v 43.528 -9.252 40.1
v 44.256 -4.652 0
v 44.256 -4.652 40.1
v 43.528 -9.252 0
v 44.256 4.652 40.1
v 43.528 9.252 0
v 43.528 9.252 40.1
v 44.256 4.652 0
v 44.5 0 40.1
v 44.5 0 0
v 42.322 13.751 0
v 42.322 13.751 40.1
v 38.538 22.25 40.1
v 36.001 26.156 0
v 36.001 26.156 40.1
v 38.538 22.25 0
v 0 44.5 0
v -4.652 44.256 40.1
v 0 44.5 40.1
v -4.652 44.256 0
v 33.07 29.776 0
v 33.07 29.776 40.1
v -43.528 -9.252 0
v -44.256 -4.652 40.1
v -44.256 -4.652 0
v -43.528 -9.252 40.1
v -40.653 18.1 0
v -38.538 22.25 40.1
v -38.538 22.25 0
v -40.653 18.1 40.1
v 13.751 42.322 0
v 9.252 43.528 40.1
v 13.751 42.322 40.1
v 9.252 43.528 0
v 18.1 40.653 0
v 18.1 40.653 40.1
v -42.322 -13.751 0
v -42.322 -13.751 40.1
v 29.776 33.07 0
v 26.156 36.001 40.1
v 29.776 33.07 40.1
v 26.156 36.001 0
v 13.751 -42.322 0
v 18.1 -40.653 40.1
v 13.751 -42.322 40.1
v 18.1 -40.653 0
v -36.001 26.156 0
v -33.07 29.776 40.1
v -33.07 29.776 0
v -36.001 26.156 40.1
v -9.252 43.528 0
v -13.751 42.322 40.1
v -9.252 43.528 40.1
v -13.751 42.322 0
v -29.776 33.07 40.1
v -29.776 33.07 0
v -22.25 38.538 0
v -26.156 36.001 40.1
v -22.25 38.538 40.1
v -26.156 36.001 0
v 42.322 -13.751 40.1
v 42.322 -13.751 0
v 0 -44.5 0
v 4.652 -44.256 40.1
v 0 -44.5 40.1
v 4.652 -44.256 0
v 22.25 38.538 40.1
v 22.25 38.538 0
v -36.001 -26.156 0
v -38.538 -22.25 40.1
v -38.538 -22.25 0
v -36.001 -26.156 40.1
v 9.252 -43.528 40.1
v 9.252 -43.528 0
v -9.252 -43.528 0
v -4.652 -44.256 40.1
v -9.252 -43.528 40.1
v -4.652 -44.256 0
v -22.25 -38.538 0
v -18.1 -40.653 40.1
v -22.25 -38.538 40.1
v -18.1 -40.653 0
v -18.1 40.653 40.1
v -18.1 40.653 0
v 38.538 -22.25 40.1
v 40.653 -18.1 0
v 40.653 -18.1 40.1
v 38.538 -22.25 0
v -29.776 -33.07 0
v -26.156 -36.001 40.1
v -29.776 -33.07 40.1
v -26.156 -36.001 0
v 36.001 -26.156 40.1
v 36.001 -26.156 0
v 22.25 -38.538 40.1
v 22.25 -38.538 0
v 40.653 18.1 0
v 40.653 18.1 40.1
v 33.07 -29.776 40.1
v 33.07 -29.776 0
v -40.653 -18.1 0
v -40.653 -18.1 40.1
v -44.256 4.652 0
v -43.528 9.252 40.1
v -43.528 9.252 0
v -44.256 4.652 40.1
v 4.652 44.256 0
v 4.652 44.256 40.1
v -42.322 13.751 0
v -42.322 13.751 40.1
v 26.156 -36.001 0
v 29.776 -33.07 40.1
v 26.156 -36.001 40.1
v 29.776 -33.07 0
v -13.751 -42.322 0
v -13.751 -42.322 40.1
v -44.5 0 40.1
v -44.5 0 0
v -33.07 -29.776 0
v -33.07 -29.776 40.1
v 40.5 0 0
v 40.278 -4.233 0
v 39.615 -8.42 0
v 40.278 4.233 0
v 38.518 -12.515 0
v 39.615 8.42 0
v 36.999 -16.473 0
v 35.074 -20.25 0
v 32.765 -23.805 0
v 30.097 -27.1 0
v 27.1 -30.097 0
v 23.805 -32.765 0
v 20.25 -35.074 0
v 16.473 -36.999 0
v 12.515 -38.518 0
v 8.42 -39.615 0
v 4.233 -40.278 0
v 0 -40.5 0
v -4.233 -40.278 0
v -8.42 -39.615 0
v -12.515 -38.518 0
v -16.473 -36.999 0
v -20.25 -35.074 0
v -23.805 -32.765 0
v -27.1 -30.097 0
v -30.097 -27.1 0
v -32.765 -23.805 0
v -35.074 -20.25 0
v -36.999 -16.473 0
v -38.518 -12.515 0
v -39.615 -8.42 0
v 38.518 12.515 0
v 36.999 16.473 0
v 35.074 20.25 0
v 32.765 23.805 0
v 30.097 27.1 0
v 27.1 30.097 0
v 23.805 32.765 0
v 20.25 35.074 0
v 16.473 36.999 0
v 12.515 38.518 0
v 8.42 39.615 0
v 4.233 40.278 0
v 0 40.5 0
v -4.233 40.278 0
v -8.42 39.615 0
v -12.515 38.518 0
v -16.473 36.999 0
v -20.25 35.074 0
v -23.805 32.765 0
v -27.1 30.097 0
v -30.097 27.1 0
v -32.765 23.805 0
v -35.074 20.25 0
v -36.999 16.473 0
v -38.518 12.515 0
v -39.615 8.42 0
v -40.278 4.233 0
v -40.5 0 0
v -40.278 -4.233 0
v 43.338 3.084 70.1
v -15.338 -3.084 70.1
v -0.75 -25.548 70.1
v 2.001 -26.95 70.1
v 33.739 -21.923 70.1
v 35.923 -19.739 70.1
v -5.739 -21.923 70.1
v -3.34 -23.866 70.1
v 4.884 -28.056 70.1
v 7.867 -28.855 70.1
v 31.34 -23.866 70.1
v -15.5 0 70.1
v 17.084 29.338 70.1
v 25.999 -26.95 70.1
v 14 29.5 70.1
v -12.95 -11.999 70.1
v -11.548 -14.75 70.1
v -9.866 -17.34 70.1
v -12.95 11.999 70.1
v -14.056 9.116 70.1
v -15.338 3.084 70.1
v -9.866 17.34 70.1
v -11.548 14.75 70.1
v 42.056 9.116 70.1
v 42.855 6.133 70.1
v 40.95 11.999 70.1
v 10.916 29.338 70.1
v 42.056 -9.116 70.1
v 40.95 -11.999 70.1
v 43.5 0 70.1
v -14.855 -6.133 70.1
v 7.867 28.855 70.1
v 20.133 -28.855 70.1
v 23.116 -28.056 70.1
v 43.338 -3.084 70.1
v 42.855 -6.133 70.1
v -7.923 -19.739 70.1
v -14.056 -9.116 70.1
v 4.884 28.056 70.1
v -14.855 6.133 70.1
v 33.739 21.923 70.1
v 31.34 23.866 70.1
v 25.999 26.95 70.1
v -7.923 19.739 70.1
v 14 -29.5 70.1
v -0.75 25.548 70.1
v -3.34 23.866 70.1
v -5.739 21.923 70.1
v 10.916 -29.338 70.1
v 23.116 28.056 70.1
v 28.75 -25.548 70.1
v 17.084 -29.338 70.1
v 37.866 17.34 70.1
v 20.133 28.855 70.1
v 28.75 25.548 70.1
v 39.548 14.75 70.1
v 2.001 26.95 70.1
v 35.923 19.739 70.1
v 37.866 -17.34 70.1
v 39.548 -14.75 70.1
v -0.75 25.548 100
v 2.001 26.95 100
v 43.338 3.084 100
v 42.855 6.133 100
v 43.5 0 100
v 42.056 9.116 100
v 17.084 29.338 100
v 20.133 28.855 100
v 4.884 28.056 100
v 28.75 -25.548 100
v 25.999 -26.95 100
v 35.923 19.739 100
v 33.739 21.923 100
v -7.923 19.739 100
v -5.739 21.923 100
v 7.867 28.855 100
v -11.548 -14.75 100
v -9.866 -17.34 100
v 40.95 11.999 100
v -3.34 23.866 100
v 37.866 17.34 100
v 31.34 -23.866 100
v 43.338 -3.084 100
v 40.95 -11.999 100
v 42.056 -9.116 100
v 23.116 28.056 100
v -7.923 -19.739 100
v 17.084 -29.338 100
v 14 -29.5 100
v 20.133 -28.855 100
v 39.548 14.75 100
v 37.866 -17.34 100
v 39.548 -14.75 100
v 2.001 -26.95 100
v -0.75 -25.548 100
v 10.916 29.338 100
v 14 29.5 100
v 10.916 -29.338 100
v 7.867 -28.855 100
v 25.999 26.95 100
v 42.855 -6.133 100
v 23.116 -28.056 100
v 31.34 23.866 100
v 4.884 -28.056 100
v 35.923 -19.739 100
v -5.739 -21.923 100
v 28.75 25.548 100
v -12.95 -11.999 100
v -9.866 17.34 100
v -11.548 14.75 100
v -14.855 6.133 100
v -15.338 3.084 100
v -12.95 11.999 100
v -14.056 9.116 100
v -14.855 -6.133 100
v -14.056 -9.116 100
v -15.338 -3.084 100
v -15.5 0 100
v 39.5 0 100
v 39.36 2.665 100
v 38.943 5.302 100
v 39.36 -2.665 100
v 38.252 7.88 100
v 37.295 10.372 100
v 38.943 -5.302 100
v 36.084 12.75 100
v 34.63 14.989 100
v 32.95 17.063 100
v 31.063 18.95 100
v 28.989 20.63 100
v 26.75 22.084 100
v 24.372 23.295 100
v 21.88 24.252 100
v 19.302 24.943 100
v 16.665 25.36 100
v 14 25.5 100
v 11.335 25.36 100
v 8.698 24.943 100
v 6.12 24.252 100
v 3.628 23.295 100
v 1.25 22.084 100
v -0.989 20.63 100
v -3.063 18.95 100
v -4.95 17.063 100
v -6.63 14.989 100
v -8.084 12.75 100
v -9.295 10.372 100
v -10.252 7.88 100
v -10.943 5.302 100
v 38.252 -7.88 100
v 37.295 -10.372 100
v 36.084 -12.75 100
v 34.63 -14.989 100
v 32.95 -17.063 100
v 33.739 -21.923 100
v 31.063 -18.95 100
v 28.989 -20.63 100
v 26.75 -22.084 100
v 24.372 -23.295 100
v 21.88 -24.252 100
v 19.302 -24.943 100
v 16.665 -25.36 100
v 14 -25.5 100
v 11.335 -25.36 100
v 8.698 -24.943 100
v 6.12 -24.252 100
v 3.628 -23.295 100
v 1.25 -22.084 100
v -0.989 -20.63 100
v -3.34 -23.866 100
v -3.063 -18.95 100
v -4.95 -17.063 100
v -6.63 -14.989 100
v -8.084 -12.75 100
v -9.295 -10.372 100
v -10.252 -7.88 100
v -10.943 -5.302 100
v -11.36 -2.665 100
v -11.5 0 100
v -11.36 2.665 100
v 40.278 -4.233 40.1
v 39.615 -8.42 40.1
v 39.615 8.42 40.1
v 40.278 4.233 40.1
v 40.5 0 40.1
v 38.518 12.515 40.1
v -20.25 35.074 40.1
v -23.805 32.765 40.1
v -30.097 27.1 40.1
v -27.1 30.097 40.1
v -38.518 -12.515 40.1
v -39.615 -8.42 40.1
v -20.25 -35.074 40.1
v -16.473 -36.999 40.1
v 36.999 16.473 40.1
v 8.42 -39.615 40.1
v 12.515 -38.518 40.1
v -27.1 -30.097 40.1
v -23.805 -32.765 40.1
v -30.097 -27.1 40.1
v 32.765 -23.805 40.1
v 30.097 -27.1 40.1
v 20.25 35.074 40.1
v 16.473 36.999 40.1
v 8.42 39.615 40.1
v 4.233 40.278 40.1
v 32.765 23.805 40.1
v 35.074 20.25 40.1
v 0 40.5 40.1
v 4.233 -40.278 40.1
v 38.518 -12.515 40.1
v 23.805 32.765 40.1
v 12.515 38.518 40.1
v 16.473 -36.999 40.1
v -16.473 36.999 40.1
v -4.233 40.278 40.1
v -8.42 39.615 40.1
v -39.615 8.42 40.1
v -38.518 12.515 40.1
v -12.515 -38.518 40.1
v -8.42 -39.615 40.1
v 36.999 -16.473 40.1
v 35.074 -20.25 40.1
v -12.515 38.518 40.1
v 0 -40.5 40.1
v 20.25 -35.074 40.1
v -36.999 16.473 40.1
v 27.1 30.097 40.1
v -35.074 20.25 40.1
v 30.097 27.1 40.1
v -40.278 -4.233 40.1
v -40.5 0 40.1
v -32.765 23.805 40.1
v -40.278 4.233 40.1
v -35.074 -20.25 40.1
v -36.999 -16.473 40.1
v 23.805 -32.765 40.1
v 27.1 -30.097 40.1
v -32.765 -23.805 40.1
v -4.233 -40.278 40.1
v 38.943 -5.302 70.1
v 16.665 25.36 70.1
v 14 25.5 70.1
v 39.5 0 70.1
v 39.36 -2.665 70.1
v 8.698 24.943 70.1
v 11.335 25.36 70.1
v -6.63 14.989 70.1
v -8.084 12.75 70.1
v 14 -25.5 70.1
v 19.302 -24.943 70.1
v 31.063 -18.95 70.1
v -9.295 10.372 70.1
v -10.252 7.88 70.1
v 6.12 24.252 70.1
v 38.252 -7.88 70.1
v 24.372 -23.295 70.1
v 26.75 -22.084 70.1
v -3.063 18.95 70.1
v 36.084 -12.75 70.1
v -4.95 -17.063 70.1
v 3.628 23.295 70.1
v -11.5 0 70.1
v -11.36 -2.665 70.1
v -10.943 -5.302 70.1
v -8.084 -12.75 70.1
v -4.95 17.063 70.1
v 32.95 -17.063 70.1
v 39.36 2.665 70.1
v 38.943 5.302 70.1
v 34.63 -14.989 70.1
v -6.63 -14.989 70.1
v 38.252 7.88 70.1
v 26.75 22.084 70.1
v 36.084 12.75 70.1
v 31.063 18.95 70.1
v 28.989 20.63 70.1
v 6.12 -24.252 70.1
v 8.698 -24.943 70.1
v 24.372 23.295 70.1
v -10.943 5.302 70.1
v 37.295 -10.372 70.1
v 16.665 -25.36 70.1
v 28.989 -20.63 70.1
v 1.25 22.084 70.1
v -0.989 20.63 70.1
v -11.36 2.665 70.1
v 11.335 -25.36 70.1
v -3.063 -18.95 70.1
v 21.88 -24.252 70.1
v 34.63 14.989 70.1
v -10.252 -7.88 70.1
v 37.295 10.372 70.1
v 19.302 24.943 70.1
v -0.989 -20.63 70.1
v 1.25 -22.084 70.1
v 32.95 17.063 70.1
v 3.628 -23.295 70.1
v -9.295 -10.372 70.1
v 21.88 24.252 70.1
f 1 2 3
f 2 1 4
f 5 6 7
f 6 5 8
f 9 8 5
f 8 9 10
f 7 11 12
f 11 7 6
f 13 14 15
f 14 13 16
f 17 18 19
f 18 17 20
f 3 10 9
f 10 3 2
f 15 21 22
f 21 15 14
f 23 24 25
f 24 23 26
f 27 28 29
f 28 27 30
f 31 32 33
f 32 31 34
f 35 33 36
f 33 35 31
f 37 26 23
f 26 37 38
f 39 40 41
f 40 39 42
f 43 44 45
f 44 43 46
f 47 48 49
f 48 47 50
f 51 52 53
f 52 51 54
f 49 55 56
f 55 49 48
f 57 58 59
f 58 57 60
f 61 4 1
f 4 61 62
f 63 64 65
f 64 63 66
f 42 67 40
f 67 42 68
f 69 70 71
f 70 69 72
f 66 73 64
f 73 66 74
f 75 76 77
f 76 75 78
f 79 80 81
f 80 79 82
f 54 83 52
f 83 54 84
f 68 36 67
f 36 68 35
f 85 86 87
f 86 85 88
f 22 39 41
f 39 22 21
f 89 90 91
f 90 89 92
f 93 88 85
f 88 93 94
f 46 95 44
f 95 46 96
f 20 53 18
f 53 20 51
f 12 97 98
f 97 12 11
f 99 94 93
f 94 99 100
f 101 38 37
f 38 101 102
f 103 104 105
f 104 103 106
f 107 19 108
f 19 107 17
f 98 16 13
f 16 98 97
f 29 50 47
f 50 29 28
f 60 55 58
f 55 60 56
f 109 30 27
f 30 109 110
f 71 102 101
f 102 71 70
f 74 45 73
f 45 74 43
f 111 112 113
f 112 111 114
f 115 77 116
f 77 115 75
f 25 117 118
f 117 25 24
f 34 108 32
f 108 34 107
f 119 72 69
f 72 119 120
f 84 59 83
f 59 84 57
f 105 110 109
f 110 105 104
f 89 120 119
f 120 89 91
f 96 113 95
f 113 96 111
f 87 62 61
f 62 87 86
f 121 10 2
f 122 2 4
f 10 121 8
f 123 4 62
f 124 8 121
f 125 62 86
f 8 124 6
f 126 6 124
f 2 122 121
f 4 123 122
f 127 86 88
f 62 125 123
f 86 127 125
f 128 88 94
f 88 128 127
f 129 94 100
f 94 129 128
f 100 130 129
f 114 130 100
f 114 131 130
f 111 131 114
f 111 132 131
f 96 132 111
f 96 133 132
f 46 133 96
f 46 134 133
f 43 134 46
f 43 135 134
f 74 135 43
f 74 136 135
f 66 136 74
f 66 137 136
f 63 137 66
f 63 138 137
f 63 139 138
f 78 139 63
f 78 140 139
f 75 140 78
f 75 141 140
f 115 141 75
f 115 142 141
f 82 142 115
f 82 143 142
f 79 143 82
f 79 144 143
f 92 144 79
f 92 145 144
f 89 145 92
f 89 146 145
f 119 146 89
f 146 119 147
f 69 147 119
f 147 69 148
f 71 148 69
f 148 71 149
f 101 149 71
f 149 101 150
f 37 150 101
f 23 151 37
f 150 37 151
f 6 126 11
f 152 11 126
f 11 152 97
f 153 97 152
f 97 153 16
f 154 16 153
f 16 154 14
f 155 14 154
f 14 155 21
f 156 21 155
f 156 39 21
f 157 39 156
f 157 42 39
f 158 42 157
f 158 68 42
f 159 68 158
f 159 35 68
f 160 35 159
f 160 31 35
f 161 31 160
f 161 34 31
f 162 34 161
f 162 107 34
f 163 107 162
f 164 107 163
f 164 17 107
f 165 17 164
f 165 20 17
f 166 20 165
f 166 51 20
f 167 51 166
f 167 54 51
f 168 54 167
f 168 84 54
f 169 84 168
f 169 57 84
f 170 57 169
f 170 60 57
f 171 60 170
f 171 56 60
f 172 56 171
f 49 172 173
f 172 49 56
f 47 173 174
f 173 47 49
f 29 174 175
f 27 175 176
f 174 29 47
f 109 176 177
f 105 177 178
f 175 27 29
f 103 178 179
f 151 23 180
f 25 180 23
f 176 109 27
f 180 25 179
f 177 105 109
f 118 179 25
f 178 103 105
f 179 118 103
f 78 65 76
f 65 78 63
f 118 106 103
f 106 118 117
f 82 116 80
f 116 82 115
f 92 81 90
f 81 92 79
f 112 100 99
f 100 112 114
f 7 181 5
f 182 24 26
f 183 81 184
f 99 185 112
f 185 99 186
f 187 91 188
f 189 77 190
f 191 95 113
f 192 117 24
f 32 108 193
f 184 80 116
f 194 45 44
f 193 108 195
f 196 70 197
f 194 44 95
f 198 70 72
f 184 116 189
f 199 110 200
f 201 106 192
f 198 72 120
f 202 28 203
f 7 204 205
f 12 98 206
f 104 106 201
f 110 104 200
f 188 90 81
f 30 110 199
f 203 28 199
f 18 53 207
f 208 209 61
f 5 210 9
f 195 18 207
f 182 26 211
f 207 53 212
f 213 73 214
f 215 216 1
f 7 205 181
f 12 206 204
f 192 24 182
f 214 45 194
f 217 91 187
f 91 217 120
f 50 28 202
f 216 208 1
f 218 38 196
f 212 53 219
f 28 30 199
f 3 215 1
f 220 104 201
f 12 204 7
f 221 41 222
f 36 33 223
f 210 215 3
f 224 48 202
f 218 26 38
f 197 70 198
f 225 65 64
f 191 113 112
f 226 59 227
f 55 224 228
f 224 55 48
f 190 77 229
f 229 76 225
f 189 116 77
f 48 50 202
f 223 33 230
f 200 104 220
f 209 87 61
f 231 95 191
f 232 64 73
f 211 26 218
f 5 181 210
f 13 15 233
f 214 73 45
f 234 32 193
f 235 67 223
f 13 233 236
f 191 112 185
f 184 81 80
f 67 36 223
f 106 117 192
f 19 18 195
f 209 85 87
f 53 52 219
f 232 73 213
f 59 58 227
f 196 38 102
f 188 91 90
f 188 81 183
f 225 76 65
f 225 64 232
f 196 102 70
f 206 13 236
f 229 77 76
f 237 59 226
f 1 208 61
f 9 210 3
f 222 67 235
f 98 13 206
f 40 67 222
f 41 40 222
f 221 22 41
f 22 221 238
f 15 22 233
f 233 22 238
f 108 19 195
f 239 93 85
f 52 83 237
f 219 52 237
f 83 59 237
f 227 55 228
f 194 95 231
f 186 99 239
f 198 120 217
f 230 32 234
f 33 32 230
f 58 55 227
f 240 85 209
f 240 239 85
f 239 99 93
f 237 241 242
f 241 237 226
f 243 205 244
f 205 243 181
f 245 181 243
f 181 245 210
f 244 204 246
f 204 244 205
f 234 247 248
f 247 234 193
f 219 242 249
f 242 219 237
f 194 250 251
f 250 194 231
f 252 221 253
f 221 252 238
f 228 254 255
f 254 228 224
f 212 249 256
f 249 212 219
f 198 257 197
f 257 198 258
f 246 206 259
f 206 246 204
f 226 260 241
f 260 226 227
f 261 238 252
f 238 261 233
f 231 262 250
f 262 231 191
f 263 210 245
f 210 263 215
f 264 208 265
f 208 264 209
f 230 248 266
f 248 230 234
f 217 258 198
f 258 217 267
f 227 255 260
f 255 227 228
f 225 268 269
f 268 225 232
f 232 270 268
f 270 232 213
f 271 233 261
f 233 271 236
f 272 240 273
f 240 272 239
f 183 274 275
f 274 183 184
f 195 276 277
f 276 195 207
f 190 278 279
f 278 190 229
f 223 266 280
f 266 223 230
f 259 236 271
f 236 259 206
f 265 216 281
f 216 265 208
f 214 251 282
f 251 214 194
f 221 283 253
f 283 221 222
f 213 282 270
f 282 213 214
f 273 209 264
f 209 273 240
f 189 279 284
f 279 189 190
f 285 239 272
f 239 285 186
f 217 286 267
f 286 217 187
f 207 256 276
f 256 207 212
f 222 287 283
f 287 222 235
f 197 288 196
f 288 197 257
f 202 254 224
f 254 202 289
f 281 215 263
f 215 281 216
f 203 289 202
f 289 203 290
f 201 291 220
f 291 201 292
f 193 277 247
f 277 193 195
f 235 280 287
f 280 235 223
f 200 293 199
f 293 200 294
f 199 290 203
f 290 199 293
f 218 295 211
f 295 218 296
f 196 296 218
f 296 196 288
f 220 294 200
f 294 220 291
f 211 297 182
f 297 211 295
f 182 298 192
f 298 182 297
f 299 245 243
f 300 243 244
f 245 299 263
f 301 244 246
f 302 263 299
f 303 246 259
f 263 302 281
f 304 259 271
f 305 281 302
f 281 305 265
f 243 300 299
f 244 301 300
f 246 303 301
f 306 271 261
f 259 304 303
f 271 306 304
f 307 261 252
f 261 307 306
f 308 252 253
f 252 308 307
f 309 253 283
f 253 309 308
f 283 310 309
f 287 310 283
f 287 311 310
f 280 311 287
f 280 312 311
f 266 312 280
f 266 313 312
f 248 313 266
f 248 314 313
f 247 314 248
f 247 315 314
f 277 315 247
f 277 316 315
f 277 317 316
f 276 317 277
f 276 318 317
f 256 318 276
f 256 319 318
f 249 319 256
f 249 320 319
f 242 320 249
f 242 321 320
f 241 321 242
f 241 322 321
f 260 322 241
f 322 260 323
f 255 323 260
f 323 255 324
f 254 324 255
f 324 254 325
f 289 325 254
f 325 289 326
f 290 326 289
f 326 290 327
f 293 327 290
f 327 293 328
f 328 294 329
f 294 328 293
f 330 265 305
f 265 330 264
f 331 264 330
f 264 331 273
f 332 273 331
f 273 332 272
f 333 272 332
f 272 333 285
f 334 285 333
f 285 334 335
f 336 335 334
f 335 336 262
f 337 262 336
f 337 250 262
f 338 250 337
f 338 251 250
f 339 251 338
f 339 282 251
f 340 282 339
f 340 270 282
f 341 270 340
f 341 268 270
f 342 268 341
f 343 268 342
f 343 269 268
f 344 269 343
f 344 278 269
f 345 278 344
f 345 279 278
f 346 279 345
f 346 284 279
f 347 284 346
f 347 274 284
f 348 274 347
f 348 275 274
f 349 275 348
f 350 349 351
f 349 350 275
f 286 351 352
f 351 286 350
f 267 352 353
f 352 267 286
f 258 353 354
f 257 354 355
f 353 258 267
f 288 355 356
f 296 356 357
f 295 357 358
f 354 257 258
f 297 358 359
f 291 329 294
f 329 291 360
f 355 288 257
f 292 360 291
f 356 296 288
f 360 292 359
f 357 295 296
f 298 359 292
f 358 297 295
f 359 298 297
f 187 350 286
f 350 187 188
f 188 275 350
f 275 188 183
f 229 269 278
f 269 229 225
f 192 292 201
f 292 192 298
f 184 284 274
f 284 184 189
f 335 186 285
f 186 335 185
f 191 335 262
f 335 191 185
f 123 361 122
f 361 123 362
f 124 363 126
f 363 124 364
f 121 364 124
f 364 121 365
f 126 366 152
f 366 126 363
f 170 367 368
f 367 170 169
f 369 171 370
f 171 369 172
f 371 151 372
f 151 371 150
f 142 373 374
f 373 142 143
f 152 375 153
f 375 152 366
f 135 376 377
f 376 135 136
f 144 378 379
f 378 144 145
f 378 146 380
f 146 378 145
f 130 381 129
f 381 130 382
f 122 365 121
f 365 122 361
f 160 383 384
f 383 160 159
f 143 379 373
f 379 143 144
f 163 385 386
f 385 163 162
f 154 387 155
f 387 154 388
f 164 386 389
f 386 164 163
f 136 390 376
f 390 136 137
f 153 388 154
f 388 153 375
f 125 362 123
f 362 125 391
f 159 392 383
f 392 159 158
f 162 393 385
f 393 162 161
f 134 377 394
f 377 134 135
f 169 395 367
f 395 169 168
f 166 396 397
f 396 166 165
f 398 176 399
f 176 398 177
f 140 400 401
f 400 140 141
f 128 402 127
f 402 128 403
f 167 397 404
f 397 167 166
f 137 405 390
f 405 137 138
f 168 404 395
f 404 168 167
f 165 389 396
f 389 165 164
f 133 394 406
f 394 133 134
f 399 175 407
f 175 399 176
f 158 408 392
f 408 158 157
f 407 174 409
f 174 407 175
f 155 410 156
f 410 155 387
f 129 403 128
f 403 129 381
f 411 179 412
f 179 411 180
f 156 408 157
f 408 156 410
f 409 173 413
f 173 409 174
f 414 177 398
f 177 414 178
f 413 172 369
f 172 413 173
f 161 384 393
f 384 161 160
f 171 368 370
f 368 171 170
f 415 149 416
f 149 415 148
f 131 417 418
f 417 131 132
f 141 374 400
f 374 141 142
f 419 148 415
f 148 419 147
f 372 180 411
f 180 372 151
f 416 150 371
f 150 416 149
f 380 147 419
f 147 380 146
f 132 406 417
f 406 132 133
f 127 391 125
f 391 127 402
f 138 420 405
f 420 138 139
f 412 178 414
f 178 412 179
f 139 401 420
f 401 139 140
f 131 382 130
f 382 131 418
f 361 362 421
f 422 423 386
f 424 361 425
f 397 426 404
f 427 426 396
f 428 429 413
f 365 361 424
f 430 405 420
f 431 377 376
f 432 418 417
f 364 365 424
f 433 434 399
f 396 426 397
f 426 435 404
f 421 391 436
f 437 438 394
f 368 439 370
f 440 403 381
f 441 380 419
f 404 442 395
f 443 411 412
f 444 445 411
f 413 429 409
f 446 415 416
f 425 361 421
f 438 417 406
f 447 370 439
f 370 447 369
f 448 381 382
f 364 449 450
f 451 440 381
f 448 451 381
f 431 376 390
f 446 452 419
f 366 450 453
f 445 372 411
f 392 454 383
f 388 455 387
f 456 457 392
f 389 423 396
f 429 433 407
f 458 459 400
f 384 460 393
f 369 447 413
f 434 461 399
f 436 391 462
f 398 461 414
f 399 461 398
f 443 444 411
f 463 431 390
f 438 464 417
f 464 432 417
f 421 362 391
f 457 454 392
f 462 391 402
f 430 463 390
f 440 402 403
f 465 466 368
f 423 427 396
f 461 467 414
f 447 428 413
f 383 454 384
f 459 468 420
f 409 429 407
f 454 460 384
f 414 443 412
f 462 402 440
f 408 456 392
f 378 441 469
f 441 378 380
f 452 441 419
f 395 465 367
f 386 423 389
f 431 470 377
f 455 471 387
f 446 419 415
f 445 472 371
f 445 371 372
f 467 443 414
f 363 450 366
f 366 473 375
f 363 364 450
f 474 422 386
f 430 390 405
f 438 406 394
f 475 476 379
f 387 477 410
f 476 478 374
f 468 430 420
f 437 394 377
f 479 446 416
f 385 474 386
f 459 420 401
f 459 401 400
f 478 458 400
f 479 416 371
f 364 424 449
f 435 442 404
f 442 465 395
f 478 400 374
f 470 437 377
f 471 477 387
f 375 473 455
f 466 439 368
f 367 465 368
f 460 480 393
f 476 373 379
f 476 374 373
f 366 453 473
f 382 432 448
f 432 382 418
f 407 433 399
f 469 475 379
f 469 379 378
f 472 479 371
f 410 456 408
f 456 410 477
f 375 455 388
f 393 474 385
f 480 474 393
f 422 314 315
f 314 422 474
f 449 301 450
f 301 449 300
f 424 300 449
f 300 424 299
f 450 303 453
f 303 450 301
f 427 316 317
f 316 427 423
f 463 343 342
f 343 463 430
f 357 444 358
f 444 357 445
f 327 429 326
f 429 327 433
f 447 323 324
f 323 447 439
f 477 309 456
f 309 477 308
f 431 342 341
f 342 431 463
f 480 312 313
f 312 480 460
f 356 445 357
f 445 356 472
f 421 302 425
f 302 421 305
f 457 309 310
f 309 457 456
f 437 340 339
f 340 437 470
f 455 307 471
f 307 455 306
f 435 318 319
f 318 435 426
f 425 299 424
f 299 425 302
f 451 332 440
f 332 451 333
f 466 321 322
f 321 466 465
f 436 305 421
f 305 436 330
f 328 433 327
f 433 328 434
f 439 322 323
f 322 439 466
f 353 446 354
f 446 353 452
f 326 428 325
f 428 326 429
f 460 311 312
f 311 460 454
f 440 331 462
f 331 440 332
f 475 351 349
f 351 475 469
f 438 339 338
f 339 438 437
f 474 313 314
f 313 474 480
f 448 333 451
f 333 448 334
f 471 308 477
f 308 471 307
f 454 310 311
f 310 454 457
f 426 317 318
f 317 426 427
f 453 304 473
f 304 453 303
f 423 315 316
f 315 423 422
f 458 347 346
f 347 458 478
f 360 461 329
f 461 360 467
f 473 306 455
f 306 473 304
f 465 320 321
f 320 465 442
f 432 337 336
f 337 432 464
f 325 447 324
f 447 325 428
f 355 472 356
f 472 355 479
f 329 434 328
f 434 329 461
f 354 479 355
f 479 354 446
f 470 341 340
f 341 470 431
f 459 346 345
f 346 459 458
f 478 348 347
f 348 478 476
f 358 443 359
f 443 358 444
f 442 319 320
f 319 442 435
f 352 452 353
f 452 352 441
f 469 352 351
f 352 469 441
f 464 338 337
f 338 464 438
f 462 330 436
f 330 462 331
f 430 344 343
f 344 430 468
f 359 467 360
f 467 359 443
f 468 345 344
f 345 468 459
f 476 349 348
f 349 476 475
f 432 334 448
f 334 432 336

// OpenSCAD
// Pipe Adapter - Parametric Design
// Connects two different diameter pipes with smooth curved transition
// Designed to fit OVER the outside of pipes (external coupling)
// Input: Inner diameters of the pipes to be connected

// ===== PIPE SPECIFICATIONS =====
// Pipe diameters that the adapter will slip over
pipe1_inner_dia = 80;    // mm - diameter that adapter end 1 will slip over
pipe2_inner_dia = 50;    // mm - diameter that adapter end 2 will slip over

// These are NOT used in calculations - kept for reference only
pipe1_wall_thickness = 6;  // mm - wall thickness of pipe 1 (reference only)
pipe2_wall_thickness = 6;  // mm - wall thickness of pipe 2 (reference only)

// ===== ADAPTER SPECIFICATIONS =====
// Adapter wall thickness
adapter_wall_thickness = 4;  // mm - wall thickness of the adapter itself

// Collar dimensions (parts that fit over the pipes)
collar1_length = 40;     // mm - length of collar for pipe 1
collar2_length = 30;     // mm - length of collar for pipe 2

// Transition section
transition_length = 30;  // mm - length of the curved transition

// Transition offset (for angled or offset adapters)
transition_offset_x = 14; // mm - horizontal offset in X direction
transition_offset_y = 0; // mm - horizontal offset in Y direction
// Note: Positive values move pipe2 end relative to pipe1 end
// Example: transition_offset_x = 10 moves pipe2 end 10mm in +X direction

// ===== FIT AND TOLERANCE =====
// Clearances for proper fit (adjust for your 3D printer's accuracy)
collar_clearance = 0.5;   // mm - radial clearance between adapter and pipe outer surface
wall_clearance = 0.1;     // mm - clearance to avoid interference

// ===== DESIGN OPTIONS =====
smooth_transition = true; // true for curved transition, false for linear (locked to true for your preference)
show_reference_pipes = false; // set to true to see pipe outlines for reference

// Rendering quality
$fn = 60; // Higher values = smoother curves, slower rendering

// ===== CALCULATED VALUES =====
// Adapter inner diameters (exact diameters you specified + clearance)
adapter1_inner_dia = pipe1_inner_dia + 2 * collar_clearance;
adapter2_inner_dia = pipe2_inner_dia + 2 * collar_clearance;

// Adapter outer diameters
adapter1_outer_dia = adapter1_inner_dia + 2 * adapter_wall_thickness;
adapter2_outer_dia = adapter2_inner_dia + 2 * adapter_wall_thickness;

// Calculate pipe outer diameters for reference display only
pipe1_outer_dia = pipe1_inner_dia + 2 * pipe1_wall_thickness;
pipe2_outer_dia = pipe2_inner_dia + 2 * pipe2_wall_thickness;

// Total length
total_length = collar1_length + transition_length + collar2_length;

// Calculate actual transition distance (accounting for offset)
actual_transition_distance = sqrt(pow(transition_length, 2) + pow(transition_offset_x, 2) + pow(transition_offset_y, 2));

// ===== VALIDATION =====
// Check that the two pipe sizes are different (adapter makes sense)
assert(pipe1_inner_dia != pipe2_inner_dia, 
    "ERROR: pipe1_inner_dia and pipe2_inner_dia must be different for an adapter to make sense");

// Check for reasonable wall thickness
assert(adapter_wall_thickness > 0.8, 
    "WARNING: adapter_wall_thickness is very thin, may not be strong enough");
assert(adapter_wall_thickness < 10, 
    "WARNING: adapter_wall_thickness is very thick, may be wasteful");

// ===== MAIN MODULE =====
module pipe_adapter() {
    difference() {
        // Outer shape
        union() {
            // Collar 1 (pipe 1 end)
            translate([0, 0, 0])
                cylinder(h = collar1_length, d = adapter1_outer_dia);
            
            // Transition section
            translate([0, 0, collar1_length])
                transition_section();
            
            // Collar 2 (pipe 2 end) - with offset
            translate([transition_offset_x, transition_offset_y, collar1_length + transition_length])
                cylinder(h = collar2_length, d = adapter2_outer_dia);
        }
        
        // Inner cavity
        union() {
            // Inner cavity for pipe 1 (fits over pipe 1)
            translate([0, 0, -0.1])
                cylinder(h = collar1_length + 0.1, d = adapter1_inner_dia);
            
            // Inner transition cavity
            translate([0, 0, collar1_length])
                inner_transition();
            
            // Inner cavity for pipe 2 (fits over pipe 2) - with offset
            translate([transition_offset_x, transition_offset_y, collar1_length + transition_length])
                cylinder(h = collar2_length + 0.1, d = adapter2_inner_dia);
        }
    }
}

// ===== TRANSITION MODULES =====
module transition_section() {
    // Always use smooth curved transition with optional offset
    hull() {
        cylinder(h = 0.1, d = adapter1_outer_dia);
        translate([transition_offset_x, transition_offset_y, transition_length])
            cylinder(h = 0.1, d = adapter2_outer_dia);
    }
}

module inner_transition() {
    // Always use smooth curved inner transition with optional offset
    hull() {
        cylinder(h = 0.1, d = adapter1_inner_dia);
        translate([transition_offset_x, transition_offset_y, transition_length])
            cylinder(h = 0.1, d = adapter2_inner_dia);
    }
}

// ===== HELPER MODULES =====
// Module to show pipe outlines for reference
module show_pipes() {
    if (show_reference_pipes) {
        color("red", 0.3) {
            // Pipe 1 outline
            translate([0, 0, -10])
                difference() {
                    cylinder(h = collar1_length + 10, d = pipe1_outer_dia);
                    cylinder(h = collar1_length + 10, d = pipe1_inner_dia);
                }
            
            // Pipe 2 outline - with offset
            translate([transition_offset_x, transition_offset_y, collar1_length + transition_length])
                difference() {
                    cylinder(h = collar2_length + 10, d = pipe2_outer_dia);
                    cylinder(h = collar2_length + 10, d = pipe2_inner_dia);
                }
        }
        
        // Show pipe bores for reference - with offset
        color("blue", 0.2) {
            translate([0, 0, -10])
                cylinder(h = total_length + 20, d = pipe1_inner_dia);
            translate([transition_offset_x, transition_offset_y, collar1_length + transition_length - 10])
                cylinder(h = collar2_length + 20, d = pipe2_inner_dia);
        }
    }
}

// ===== INFORMATION DISPLAY =====
echo("=== PIPE ADAPTER SPECIFICATIONS ===");
echo(str("Adapter hole 1 diameter: ", adapter1_inner_dia, "mm (slips over ", pipe1_inner_dia, "mm pipe)"));
echo(str("Adapter hole 2 diameter: ", adapter2_inner_dia, "mm (slips over ", pipe2_inner_dia, "mm pipe)"));
echo(str("Adapter wall thickness: ", adapter_wall_thickness, "mm"));
echo(str("Total adapter length: ", total_length, "mm"));
echo(str("Transition offset: X=", transition_offset_x, "mm, Y=", transition_offset_y, "mm"));
echo(str("Actual transition distance: ", actual_transition_distance, "mm"));
echo(str("Adapter 1 - Inner: ", adapter1_inner_dia, "mm, Outer: ", adapter1_outer_dia, "mm"));
echo(str("Adapter 2 - Inner: ", adapter2_inner_dia, "mm, Outer: ", adapter2_outer_dia, "mm"));
echo(str("Collar clearance: ", collar_clearance, "mm"));

// ===== RENDER THE ADAPTER =====
pipe_adapter();

// Show reference pipes if enabled
show_pipes();
